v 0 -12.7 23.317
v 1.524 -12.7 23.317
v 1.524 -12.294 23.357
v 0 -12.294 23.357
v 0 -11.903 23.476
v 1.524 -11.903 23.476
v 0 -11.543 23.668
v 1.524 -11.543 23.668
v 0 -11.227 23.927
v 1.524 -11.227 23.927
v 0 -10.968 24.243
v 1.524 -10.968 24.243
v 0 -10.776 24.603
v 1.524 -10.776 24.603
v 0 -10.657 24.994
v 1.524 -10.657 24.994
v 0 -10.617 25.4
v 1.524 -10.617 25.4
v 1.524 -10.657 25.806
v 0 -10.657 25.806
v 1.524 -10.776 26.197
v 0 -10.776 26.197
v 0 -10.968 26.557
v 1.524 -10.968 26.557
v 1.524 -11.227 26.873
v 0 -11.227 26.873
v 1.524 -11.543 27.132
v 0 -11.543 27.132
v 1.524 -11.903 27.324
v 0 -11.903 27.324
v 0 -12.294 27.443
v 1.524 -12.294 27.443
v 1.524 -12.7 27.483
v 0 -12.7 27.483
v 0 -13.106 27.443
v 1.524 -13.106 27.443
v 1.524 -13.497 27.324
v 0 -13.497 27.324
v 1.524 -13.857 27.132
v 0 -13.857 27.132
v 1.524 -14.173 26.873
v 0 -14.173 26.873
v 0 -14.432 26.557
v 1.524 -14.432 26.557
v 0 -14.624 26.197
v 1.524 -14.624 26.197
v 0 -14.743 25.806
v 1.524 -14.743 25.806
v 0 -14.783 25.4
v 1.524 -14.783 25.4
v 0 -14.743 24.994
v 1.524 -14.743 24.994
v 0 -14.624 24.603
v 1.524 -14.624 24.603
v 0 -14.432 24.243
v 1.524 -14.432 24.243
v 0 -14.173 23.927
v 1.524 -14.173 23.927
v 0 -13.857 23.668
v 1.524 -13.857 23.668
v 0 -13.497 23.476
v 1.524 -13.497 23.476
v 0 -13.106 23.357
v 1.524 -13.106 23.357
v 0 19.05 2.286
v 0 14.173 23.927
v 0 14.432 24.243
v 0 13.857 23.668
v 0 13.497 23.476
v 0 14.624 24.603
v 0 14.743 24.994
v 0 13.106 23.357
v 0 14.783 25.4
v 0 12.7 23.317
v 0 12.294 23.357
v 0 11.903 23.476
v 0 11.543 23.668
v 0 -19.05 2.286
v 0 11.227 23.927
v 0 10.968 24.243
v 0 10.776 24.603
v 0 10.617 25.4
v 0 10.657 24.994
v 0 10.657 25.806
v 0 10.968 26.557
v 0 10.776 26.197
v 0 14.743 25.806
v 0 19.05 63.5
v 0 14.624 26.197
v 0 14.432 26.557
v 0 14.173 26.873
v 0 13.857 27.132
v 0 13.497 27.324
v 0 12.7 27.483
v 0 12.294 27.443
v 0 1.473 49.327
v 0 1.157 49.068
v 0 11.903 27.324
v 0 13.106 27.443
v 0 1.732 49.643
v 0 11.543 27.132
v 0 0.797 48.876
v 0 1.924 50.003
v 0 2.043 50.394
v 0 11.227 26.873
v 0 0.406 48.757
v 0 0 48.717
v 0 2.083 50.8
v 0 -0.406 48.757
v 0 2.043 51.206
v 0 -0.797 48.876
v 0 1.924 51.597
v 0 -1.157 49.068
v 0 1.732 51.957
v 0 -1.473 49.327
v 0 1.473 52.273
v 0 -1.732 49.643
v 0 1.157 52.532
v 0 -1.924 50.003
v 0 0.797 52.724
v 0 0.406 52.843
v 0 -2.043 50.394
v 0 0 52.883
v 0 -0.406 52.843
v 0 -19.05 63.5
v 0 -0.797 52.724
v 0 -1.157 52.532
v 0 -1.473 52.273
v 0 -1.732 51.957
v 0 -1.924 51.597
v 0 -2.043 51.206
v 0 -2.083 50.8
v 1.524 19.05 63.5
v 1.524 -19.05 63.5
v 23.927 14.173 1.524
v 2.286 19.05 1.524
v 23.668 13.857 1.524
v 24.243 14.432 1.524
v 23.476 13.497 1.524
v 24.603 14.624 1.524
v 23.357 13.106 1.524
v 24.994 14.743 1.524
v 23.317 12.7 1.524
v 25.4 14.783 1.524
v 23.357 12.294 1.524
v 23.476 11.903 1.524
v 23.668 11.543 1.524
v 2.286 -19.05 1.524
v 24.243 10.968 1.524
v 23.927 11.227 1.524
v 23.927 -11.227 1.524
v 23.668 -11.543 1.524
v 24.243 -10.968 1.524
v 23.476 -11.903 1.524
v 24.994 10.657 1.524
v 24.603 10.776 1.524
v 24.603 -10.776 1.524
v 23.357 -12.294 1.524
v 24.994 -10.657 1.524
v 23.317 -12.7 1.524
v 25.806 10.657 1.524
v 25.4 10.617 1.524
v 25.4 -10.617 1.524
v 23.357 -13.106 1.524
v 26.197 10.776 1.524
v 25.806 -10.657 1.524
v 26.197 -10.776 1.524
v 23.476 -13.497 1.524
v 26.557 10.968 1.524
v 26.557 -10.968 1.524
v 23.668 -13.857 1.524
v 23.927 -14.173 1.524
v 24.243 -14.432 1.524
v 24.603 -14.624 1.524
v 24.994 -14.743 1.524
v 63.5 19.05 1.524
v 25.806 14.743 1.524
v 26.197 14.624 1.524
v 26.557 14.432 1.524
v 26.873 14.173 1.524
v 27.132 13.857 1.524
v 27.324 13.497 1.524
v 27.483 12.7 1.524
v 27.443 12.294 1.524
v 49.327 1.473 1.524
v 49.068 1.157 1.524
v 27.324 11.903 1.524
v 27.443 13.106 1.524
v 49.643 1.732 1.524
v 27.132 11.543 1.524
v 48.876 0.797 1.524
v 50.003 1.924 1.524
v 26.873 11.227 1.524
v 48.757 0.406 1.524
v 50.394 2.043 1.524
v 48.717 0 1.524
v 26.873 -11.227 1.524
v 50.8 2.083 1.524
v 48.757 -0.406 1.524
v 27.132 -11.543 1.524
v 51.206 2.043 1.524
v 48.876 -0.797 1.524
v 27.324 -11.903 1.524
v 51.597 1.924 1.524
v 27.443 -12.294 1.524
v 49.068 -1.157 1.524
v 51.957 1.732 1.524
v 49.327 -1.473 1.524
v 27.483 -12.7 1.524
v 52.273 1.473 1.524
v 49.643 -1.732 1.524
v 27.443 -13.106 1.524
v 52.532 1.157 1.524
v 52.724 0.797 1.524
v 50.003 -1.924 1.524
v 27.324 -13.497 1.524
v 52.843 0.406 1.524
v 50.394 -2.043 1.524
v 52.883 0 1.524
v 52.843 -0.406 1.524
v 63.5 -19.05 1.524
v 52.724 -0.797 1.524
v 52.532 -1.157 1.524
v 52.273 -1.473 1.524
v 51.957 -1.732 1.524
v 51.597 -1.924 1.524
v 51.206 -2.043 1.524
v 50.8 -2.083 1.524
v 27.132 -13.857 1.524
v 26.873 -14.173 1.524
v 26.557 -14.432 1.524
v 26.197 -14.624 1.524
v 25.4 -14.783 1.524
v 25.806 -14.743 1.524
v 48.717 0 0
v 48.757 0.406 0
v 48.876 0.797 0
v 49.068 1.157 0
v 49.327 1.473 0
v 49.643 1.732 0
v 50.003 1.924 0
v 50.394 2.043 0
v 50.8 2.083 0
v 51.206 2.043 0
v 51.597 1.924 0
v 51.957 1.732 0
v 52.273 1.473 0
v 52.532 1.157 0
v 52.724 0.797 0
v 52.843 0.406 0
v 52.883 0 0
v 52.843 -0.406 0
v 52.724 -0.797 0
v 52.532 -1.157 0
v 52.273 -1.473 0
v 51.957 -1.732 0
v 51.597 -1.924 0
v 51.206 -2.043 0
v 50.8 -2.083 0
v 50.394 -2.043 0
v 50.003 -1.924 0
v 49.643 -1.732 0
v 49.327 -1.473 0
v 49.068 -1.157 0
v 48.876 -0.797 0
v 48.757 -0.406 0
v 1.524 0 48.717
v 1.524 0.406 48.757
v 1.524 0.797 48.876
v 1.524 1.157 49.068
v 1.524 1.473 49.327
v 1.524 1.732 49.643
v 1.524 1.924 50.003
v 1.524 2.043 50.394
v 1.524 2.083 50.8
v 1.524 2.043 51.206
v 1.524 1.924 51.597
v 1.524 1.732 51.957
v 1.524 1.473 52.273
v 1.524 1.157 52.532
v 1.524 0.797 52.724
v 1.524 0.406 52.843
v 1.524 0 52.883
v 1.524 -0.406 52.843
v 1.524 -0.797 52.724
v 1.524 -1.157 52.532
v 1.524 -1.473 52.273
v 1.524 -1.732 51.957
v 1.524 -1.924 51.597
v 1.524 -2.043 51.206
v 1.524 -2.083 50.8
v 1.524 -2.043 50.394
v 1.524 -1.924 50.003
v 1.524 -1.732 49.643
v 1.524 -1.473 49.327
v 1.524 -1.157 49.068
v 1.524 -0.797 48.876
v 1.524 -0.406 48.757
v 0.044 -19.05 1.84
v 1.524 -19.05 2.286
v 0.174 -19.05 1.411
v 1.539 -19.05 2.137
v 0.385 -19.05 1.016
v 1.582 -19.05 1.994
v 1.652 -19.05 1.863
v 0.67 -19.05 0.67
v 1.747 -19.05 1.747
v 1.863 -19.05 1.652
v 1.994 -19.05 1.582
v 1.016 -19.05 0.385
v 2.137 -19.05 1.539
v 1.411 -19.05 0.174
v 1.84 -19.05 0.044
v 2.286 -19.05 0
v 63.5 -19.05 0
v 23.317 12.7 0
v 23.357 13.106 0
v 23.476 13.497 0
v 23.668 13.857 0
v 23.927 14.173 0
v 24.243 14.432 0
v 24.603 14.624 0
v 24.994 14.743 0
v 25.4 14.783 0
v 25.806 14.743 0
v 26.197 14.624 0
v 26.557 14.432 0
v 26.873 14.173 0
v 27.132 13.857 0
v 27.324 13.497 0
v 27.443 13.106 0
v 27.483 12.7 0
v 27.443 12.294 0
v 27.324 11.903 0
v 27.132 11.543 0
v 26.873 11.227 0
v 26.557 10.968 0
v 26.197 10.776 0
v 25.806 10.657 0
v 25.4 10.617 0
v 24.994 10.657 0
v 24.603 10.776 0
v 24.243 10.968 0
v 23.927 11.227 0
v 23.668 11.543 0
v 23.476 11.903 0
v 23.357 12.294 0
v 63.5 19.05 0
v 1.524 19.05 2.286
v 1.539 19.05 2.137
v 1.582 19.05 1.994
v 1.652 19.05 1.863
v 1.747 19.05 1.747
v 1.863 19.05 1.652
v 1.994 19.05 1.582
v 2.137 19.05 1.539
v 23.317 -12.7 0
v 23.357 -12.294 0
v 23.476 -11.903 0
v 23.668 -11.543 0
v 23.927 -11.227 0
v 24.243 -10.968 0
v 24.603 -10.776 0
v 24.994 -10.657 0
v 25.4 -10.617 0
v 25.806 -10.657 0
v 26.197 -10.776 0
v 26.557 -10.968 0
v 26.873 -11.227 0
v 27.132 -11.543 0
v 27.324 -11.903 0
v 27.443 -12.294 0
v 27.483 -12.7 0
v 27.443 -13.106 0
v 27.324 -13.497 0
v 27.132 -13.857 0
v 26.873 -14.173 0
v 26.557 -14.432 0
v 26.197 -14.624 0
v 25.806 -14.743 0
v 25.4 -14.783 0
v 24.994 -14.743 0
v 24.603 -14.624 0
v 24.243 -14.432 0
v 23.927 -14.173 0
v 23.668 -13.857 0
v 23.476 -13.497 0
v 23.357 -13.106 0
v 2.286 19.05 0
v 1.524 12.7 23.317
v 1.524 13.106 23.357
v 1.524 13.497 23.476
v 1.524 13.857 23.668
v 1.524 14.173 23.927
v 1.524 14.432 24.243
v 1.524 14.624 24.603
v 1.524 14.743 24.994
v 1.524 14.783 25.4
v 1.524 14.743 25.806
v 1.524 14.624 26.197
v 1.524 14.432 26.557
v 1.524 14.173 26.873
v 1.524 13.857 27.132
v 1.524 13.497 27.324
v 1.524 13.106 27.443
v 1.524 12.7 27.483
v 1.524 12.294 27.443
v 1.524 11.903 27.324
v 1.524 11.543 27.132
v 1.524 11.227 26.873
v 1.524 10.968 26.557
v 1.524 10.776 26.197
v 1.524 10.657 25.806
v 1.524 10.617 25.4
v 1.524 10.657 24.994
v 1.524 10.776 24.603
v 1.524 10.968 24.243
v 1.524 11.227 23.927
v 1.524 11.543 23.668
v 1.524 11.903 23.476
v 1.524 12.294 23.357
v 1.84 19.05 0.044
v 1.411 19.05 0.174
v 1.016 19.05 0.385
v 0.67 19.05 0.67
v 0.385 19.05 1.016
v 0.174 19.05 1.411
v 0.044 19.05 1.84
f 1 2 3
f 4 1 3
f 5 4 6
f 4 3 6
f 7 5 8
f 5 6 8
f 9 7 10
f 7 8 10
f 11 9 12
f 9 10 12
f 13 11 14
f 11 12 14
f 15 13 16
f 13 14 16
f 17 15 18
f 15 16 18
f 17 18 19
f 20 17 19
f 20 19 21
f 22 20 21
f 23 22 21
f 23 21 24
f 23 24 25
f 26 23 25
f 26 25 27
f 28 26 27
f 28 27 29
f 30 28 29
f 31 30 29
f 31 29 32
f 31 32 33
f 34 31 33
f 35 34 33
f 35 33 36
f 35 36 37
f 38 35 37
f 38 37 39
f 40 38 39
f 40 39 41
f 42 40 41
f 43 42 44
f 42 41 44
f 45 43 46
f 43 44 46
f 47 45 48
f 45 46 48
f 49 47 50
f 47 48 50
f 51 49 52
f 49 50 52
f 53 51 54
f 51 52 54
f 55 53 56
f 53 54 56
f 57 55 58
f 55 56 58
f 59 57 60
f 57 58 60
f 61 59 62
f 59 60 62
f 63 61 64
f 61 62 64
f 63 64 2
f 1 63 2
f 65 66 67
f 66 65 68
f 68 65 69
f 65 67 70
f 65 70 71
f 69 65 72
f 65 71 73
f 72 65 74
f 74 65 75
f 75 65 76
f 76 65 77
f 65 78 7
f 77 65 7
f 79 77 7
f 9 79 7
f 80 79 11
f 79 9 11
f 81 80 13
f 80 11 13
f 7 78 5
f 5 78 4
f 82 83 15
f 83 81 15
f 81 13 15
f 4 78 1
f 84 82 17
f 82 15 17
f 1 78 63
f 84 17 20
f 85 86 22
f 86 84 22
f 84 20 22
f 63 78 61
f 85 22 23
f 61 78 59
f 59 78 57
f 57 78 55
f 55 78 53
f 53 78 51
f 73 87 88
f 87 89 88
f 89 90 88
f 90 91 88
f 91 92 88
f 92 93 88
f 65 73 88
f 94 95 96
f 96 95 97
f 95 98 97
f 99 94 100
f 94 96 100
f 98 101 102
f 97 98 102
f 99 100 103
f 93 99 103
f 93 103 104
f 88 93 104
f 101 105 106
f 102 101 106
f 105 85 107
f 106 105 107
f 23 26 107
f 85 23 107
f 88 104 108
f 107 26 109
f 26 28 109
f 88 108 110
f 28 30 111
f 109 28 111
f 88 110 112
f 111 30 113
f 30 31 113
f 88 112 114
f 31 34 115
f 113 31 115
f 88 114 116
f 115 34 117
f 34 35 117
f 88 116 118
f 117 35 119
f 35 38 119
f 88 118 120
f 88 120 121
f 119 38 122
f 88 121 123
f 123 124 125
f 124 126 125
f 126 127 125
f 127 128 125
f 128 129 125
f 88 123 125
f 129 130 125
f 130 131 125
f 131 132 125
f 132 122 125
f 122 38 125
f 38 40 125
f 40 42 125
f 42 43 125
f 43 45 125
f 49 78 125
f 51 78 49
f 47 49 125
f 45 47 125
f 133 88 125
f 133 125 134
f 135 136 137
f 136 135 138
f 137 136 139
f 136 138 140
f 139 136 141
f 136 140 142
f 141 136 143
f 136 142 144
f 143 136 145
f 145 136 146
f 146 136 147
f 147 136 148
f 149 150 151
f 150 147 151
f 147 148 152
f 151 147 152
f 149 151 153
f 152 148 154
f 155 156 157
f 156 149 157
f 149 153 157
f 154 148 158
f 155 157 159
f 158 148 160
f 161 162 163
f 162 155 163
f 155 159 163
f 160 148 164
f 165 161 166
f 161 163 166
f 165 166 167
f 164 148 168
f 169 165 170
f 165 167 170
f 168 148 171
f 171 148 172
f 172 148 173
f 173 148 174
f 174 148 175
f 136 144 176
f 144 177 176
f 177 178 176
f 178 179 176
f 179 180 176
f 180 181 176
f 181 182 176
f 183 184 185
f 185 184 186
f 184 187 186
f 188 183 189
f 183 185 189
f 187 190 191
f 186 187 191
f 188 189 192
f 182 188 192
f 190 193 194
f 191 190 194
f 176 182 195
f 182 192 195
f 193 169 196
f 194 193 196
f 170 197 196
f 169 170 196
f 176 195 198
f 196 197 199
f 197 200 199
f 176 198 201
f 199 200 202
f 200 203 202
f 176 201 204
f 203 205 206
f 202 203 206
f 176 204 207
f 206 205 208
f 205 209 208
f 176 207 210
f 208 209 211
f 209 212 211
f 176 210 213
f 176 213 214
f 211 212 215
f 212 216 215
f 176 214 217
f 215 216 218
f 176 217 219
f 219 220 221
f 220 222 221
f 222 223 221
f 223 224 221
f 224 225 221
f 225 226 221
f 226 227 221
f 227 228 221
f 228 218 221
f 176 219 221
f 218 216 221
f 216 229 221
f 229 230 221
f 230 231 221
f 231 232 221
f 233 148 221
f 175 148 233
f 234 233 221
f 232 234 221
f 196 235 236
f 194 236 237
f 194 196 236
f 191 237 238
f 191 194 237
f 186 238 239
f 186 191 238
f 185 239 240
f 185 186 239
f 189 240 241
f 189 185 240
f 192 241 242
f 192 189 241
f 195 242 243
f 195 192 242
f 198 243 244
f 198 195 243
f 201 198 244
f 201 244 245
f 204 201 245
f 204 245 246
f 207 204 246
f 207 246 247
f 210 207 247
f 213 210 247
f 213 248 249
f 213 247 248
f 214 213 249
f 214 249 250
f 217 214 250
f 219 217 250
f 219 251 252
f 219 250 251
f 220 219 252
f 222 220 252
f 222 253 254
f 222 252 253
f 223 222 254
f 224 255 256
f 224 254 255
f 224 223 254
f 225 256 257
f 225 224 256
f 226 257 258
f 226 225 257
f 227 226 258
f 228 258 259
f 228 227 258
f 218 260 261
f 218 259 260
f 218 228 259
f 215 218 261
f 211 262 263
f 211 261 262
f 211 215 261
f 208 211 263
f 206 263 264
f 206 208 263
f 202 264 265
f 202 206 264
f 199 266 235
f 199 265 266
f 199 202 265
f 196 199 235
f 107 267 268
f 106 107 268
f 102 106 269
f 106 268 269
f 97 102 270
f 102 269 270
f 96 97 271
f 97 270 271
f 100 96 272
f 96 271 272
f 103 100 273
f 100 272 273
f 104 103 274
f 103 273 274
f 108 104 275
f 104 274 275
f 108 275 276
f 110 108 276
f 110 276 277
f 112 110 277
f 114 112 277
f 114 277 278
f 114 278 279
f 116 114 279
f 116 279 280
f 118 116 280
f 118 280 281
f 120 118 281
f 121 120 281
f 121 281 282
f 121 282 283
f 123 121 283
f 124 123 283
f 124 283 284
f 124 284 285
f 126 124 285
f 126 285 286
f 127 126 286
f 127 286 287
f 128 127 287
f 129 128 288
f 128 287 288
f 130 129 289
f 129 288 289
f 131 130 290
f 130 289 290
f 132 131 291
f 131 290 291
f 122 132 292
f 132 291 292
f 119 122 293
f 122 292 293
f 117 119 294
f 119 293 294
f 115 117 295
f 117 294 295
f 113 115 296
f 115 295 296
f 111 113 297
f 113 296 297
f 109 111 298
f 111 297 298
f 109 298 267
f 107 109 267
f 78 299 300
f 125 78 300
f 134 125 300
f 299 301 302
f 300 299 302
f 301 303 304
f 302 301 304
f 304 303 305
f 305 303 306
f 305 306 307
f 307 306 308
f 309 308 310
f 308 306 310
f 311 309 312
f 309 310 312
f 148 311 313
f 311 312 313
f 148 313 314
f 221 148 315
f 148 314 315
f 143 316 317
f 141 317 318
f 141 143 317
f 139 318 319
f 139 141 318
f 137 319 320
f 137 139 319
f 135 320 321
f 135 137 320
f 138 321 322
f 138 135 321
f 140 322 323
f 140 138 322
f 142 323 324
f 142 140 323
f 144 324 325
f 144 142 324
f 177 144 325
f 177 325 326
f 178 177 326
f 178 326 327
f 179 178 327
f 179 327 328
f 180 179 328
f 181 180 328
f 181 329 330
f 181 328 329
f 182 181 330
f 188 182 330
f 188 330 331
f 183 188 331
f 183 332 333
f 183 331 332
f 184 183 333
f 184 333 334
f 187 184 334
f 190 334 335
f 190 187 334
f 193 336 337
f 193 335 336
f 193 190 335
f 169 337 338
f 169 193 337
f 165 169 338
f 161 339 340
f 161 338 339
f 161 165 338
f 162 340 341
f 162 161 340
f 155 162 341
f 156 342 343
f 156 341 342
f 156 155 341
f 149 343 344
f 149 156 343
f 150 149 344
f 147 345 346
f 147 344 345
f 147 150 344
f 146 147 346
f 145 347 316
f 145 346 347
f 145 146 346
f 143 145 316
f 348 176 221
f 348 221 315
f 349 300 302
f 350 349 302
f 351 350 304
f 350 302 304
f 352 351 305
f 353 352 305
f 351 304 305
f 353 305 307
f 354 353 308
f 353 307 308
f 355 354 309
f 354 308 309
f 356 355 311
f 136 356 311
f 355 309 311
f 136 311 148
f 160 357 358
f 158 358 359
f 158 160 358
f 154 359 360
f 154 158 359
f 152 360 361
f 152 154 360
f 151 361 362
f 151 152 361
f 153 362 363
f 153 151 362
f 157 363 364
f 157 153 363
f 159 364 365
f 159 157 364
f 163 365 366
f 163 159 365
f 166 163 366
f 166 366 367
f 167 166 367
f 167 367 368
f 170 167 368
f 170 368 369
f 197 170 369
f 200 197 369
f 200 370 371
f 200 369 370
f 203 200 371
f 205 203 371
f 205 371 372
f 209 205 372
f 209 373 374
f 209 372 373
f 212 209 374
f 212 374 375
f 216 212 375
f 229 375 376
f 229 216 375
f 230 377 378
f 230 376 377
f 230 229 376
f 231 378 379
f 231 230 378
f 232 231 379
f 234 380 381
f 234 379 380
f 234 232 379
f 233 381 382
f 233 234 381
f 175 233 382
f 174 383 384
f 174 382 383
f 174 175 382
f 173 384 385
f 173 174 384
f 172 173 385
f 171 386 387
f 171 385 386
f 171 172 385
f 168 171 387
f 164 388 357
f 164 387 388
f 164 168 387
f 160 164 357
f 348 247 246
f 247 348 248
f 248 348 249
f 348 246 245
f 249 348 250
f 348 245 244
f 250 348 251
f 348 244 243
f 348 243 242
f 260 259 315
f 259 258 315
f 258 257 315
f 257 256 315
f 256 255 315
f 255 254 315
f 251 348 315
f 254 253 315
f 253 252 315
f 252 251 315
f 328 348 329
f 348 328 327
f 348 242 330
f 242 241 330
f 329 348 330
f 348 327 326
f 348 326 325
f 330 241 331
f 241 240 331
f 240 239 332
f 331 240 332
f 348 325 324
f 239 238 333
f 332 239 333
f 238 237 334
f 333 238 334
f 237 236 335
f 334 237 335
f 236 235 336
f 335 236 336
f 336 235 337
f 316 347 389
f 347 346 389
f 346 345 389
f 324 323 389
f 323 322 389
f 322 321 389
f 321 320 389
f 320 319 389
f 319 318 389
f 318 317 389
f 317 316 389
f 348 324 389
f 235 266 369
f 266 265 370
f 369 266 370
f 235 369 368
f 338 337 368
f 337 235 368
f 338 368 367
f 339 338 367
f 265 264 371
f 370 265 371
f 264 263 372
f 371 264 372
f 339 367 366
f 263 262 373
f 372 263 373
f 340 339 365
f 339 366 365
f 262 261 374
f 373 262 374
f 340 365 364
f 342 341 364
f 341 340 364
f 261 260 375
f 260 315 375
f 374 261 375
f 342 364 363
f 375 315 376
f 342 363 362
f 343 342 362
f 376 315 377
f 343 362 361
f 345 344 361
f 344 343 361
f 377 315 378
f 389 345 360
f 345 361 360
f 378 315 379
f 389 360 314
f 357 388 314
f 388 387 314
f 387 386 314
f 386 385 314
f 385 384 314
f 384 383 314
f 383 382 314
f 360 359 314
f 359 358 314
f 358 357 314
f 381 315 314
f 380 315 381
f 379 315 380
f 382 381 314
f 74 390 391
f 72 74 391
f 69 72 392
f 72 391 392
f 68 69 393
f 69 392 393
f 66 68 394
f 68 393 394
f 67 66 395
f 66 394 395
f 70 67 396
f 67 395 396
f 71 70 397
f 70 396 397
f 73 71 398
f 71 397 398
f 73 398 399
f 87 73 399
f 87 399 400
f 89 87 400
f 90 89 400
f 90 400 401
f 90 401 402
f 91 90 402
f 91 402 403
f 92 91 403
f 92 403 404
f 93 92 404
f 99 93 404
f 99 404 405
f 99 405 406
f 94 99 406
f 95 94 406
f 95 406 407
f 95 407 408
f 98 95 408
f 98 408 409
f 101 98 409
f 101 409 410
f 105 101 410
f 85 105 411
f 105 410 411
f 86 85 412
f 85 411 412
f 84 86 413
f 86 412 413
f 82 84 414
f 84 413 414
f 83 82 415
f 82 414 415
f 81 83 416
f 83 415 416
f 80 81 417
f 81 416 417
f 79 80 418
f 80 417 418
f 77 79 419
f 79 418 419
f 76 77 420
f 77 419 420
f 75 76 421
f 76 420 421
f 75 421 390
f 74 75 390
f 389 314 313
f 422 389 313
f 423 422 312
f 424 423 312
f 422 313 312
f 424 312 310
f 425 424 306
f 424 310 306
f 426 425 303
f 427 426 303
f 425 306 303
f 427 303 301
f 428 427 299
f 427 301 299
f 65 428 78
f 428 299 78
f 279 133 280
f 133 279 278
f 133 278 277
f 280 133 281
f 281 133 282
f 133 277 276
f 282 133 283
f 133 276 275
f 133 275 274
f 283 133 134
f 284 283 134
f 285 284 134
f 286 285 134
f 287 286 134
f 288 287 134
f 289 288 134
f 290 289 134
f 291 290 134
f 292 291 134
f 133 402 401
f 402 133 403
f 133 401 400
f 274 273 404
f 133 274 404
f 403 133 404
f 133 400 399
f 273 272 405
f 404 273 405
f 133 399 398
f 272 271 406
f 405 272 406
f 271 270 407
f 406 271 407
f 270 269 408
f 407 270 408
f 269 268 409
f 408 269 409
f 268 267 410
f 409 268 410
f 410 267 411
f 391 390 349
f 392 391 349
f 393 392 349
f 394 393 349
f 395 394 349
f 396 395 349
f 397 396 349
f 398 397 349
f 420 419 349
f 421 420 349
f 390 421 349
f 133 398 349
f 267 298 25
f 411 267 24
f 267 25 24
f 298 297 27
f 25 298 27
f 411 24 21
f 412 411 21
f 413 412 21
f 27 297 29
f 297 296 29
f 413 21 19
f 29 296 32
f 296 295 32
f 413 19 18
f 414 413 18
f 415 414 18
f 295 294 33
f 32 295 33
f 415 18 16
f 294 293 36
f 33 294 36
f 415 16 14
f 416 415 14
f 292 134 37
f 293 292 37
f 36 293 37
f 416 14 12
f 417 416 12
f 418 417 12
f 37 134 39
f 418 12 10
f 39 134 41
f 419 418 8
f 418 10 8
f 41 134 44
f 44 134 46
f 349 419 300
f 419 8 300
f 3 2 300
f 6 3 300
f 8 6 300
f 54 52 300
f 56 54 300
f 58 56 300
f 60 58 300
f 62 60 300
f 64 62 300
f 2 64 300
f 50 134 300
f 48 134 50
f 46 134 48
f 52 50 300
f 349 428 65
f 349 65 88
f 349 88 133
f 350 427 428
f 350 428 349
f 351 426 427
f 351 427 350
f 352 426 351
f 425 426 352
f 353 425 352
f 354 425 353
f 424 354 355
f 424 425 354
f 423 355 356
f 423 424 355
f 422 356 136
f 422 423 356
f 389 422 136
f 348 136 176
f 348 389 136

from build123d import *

# Parameters (mm, degrees)
EXTRUDE_THIN1_START = -19.05
EXTRUDE_THIN1_DEPTH = 38.1
SKETCH4_R           = 2.0828
EXTRUDE3_DEPTH      = 91.75338603


# Read off the part's stored shape, not the designer's step: Extrude-Thin1
with BuildPart() as part:
    # Extrude-Thin1 outline → Extrude-Thin1 (new body)
    with BuildSketch(Plane(origin=(0, 0, 0), x_dir=(1, 0, 0), z_dir=(0, 1, 0)).offset(EXTRUDE_THIN1_START)):
        with BuildLine():
            Line((2.286, -1.524), (63.5, -1.524))
            Line((63.5, -1.524), (63.5, 0))
            Line((63.5, 0), (2.286, 0))
            ThreePointArc((2.286, 0), (0.669553898, -0.669553898), (0, -2.286))
            Line((0, -2.286), (0, -63.5))
            Line((0, -63.5), (1.524, -63.5))
            Line((1.524, -63.5), (1.524, -2.286))
            ThreePointArc((1.524, -2.286), (1.747184633, -1.747184633), (2.286, -1.524))
        make_face()
    extrude(amount=EXTRUDE_THIN1_DEPTH)

    # Sketch4 → Extrude3 (cut, through all)
    with BuildSketch(Plane(origin=(1.524, 0, 0), x_dir=(0, 0, -1), z_dir=(1, 0, 0))):
        with Locations((-50.8, 0)):
            Circle(SKETCH4_R)
        with Locations((-25.4, 12.7)):
            Circle(SKETCH4_R)
        with Locations((-25.4, -12.7)):
            Circle(SKETCH4_R)
    extrude3 = extrude(amount=-EXTRUDE3_DEPTH, mode=Mode.SUBTRACT)

    # Mirror1: Extrude3 across plane
    add(extrude3.mirror(Plane(origin=(0, 0, 0), x_dir=(0.7071067811865465, 0, 0.7071067811865486), z_dir=(-0.7071067811865488, 0, 0.7071067811865464))), mode=Mode.SUBTRACT)


solid = part.part
